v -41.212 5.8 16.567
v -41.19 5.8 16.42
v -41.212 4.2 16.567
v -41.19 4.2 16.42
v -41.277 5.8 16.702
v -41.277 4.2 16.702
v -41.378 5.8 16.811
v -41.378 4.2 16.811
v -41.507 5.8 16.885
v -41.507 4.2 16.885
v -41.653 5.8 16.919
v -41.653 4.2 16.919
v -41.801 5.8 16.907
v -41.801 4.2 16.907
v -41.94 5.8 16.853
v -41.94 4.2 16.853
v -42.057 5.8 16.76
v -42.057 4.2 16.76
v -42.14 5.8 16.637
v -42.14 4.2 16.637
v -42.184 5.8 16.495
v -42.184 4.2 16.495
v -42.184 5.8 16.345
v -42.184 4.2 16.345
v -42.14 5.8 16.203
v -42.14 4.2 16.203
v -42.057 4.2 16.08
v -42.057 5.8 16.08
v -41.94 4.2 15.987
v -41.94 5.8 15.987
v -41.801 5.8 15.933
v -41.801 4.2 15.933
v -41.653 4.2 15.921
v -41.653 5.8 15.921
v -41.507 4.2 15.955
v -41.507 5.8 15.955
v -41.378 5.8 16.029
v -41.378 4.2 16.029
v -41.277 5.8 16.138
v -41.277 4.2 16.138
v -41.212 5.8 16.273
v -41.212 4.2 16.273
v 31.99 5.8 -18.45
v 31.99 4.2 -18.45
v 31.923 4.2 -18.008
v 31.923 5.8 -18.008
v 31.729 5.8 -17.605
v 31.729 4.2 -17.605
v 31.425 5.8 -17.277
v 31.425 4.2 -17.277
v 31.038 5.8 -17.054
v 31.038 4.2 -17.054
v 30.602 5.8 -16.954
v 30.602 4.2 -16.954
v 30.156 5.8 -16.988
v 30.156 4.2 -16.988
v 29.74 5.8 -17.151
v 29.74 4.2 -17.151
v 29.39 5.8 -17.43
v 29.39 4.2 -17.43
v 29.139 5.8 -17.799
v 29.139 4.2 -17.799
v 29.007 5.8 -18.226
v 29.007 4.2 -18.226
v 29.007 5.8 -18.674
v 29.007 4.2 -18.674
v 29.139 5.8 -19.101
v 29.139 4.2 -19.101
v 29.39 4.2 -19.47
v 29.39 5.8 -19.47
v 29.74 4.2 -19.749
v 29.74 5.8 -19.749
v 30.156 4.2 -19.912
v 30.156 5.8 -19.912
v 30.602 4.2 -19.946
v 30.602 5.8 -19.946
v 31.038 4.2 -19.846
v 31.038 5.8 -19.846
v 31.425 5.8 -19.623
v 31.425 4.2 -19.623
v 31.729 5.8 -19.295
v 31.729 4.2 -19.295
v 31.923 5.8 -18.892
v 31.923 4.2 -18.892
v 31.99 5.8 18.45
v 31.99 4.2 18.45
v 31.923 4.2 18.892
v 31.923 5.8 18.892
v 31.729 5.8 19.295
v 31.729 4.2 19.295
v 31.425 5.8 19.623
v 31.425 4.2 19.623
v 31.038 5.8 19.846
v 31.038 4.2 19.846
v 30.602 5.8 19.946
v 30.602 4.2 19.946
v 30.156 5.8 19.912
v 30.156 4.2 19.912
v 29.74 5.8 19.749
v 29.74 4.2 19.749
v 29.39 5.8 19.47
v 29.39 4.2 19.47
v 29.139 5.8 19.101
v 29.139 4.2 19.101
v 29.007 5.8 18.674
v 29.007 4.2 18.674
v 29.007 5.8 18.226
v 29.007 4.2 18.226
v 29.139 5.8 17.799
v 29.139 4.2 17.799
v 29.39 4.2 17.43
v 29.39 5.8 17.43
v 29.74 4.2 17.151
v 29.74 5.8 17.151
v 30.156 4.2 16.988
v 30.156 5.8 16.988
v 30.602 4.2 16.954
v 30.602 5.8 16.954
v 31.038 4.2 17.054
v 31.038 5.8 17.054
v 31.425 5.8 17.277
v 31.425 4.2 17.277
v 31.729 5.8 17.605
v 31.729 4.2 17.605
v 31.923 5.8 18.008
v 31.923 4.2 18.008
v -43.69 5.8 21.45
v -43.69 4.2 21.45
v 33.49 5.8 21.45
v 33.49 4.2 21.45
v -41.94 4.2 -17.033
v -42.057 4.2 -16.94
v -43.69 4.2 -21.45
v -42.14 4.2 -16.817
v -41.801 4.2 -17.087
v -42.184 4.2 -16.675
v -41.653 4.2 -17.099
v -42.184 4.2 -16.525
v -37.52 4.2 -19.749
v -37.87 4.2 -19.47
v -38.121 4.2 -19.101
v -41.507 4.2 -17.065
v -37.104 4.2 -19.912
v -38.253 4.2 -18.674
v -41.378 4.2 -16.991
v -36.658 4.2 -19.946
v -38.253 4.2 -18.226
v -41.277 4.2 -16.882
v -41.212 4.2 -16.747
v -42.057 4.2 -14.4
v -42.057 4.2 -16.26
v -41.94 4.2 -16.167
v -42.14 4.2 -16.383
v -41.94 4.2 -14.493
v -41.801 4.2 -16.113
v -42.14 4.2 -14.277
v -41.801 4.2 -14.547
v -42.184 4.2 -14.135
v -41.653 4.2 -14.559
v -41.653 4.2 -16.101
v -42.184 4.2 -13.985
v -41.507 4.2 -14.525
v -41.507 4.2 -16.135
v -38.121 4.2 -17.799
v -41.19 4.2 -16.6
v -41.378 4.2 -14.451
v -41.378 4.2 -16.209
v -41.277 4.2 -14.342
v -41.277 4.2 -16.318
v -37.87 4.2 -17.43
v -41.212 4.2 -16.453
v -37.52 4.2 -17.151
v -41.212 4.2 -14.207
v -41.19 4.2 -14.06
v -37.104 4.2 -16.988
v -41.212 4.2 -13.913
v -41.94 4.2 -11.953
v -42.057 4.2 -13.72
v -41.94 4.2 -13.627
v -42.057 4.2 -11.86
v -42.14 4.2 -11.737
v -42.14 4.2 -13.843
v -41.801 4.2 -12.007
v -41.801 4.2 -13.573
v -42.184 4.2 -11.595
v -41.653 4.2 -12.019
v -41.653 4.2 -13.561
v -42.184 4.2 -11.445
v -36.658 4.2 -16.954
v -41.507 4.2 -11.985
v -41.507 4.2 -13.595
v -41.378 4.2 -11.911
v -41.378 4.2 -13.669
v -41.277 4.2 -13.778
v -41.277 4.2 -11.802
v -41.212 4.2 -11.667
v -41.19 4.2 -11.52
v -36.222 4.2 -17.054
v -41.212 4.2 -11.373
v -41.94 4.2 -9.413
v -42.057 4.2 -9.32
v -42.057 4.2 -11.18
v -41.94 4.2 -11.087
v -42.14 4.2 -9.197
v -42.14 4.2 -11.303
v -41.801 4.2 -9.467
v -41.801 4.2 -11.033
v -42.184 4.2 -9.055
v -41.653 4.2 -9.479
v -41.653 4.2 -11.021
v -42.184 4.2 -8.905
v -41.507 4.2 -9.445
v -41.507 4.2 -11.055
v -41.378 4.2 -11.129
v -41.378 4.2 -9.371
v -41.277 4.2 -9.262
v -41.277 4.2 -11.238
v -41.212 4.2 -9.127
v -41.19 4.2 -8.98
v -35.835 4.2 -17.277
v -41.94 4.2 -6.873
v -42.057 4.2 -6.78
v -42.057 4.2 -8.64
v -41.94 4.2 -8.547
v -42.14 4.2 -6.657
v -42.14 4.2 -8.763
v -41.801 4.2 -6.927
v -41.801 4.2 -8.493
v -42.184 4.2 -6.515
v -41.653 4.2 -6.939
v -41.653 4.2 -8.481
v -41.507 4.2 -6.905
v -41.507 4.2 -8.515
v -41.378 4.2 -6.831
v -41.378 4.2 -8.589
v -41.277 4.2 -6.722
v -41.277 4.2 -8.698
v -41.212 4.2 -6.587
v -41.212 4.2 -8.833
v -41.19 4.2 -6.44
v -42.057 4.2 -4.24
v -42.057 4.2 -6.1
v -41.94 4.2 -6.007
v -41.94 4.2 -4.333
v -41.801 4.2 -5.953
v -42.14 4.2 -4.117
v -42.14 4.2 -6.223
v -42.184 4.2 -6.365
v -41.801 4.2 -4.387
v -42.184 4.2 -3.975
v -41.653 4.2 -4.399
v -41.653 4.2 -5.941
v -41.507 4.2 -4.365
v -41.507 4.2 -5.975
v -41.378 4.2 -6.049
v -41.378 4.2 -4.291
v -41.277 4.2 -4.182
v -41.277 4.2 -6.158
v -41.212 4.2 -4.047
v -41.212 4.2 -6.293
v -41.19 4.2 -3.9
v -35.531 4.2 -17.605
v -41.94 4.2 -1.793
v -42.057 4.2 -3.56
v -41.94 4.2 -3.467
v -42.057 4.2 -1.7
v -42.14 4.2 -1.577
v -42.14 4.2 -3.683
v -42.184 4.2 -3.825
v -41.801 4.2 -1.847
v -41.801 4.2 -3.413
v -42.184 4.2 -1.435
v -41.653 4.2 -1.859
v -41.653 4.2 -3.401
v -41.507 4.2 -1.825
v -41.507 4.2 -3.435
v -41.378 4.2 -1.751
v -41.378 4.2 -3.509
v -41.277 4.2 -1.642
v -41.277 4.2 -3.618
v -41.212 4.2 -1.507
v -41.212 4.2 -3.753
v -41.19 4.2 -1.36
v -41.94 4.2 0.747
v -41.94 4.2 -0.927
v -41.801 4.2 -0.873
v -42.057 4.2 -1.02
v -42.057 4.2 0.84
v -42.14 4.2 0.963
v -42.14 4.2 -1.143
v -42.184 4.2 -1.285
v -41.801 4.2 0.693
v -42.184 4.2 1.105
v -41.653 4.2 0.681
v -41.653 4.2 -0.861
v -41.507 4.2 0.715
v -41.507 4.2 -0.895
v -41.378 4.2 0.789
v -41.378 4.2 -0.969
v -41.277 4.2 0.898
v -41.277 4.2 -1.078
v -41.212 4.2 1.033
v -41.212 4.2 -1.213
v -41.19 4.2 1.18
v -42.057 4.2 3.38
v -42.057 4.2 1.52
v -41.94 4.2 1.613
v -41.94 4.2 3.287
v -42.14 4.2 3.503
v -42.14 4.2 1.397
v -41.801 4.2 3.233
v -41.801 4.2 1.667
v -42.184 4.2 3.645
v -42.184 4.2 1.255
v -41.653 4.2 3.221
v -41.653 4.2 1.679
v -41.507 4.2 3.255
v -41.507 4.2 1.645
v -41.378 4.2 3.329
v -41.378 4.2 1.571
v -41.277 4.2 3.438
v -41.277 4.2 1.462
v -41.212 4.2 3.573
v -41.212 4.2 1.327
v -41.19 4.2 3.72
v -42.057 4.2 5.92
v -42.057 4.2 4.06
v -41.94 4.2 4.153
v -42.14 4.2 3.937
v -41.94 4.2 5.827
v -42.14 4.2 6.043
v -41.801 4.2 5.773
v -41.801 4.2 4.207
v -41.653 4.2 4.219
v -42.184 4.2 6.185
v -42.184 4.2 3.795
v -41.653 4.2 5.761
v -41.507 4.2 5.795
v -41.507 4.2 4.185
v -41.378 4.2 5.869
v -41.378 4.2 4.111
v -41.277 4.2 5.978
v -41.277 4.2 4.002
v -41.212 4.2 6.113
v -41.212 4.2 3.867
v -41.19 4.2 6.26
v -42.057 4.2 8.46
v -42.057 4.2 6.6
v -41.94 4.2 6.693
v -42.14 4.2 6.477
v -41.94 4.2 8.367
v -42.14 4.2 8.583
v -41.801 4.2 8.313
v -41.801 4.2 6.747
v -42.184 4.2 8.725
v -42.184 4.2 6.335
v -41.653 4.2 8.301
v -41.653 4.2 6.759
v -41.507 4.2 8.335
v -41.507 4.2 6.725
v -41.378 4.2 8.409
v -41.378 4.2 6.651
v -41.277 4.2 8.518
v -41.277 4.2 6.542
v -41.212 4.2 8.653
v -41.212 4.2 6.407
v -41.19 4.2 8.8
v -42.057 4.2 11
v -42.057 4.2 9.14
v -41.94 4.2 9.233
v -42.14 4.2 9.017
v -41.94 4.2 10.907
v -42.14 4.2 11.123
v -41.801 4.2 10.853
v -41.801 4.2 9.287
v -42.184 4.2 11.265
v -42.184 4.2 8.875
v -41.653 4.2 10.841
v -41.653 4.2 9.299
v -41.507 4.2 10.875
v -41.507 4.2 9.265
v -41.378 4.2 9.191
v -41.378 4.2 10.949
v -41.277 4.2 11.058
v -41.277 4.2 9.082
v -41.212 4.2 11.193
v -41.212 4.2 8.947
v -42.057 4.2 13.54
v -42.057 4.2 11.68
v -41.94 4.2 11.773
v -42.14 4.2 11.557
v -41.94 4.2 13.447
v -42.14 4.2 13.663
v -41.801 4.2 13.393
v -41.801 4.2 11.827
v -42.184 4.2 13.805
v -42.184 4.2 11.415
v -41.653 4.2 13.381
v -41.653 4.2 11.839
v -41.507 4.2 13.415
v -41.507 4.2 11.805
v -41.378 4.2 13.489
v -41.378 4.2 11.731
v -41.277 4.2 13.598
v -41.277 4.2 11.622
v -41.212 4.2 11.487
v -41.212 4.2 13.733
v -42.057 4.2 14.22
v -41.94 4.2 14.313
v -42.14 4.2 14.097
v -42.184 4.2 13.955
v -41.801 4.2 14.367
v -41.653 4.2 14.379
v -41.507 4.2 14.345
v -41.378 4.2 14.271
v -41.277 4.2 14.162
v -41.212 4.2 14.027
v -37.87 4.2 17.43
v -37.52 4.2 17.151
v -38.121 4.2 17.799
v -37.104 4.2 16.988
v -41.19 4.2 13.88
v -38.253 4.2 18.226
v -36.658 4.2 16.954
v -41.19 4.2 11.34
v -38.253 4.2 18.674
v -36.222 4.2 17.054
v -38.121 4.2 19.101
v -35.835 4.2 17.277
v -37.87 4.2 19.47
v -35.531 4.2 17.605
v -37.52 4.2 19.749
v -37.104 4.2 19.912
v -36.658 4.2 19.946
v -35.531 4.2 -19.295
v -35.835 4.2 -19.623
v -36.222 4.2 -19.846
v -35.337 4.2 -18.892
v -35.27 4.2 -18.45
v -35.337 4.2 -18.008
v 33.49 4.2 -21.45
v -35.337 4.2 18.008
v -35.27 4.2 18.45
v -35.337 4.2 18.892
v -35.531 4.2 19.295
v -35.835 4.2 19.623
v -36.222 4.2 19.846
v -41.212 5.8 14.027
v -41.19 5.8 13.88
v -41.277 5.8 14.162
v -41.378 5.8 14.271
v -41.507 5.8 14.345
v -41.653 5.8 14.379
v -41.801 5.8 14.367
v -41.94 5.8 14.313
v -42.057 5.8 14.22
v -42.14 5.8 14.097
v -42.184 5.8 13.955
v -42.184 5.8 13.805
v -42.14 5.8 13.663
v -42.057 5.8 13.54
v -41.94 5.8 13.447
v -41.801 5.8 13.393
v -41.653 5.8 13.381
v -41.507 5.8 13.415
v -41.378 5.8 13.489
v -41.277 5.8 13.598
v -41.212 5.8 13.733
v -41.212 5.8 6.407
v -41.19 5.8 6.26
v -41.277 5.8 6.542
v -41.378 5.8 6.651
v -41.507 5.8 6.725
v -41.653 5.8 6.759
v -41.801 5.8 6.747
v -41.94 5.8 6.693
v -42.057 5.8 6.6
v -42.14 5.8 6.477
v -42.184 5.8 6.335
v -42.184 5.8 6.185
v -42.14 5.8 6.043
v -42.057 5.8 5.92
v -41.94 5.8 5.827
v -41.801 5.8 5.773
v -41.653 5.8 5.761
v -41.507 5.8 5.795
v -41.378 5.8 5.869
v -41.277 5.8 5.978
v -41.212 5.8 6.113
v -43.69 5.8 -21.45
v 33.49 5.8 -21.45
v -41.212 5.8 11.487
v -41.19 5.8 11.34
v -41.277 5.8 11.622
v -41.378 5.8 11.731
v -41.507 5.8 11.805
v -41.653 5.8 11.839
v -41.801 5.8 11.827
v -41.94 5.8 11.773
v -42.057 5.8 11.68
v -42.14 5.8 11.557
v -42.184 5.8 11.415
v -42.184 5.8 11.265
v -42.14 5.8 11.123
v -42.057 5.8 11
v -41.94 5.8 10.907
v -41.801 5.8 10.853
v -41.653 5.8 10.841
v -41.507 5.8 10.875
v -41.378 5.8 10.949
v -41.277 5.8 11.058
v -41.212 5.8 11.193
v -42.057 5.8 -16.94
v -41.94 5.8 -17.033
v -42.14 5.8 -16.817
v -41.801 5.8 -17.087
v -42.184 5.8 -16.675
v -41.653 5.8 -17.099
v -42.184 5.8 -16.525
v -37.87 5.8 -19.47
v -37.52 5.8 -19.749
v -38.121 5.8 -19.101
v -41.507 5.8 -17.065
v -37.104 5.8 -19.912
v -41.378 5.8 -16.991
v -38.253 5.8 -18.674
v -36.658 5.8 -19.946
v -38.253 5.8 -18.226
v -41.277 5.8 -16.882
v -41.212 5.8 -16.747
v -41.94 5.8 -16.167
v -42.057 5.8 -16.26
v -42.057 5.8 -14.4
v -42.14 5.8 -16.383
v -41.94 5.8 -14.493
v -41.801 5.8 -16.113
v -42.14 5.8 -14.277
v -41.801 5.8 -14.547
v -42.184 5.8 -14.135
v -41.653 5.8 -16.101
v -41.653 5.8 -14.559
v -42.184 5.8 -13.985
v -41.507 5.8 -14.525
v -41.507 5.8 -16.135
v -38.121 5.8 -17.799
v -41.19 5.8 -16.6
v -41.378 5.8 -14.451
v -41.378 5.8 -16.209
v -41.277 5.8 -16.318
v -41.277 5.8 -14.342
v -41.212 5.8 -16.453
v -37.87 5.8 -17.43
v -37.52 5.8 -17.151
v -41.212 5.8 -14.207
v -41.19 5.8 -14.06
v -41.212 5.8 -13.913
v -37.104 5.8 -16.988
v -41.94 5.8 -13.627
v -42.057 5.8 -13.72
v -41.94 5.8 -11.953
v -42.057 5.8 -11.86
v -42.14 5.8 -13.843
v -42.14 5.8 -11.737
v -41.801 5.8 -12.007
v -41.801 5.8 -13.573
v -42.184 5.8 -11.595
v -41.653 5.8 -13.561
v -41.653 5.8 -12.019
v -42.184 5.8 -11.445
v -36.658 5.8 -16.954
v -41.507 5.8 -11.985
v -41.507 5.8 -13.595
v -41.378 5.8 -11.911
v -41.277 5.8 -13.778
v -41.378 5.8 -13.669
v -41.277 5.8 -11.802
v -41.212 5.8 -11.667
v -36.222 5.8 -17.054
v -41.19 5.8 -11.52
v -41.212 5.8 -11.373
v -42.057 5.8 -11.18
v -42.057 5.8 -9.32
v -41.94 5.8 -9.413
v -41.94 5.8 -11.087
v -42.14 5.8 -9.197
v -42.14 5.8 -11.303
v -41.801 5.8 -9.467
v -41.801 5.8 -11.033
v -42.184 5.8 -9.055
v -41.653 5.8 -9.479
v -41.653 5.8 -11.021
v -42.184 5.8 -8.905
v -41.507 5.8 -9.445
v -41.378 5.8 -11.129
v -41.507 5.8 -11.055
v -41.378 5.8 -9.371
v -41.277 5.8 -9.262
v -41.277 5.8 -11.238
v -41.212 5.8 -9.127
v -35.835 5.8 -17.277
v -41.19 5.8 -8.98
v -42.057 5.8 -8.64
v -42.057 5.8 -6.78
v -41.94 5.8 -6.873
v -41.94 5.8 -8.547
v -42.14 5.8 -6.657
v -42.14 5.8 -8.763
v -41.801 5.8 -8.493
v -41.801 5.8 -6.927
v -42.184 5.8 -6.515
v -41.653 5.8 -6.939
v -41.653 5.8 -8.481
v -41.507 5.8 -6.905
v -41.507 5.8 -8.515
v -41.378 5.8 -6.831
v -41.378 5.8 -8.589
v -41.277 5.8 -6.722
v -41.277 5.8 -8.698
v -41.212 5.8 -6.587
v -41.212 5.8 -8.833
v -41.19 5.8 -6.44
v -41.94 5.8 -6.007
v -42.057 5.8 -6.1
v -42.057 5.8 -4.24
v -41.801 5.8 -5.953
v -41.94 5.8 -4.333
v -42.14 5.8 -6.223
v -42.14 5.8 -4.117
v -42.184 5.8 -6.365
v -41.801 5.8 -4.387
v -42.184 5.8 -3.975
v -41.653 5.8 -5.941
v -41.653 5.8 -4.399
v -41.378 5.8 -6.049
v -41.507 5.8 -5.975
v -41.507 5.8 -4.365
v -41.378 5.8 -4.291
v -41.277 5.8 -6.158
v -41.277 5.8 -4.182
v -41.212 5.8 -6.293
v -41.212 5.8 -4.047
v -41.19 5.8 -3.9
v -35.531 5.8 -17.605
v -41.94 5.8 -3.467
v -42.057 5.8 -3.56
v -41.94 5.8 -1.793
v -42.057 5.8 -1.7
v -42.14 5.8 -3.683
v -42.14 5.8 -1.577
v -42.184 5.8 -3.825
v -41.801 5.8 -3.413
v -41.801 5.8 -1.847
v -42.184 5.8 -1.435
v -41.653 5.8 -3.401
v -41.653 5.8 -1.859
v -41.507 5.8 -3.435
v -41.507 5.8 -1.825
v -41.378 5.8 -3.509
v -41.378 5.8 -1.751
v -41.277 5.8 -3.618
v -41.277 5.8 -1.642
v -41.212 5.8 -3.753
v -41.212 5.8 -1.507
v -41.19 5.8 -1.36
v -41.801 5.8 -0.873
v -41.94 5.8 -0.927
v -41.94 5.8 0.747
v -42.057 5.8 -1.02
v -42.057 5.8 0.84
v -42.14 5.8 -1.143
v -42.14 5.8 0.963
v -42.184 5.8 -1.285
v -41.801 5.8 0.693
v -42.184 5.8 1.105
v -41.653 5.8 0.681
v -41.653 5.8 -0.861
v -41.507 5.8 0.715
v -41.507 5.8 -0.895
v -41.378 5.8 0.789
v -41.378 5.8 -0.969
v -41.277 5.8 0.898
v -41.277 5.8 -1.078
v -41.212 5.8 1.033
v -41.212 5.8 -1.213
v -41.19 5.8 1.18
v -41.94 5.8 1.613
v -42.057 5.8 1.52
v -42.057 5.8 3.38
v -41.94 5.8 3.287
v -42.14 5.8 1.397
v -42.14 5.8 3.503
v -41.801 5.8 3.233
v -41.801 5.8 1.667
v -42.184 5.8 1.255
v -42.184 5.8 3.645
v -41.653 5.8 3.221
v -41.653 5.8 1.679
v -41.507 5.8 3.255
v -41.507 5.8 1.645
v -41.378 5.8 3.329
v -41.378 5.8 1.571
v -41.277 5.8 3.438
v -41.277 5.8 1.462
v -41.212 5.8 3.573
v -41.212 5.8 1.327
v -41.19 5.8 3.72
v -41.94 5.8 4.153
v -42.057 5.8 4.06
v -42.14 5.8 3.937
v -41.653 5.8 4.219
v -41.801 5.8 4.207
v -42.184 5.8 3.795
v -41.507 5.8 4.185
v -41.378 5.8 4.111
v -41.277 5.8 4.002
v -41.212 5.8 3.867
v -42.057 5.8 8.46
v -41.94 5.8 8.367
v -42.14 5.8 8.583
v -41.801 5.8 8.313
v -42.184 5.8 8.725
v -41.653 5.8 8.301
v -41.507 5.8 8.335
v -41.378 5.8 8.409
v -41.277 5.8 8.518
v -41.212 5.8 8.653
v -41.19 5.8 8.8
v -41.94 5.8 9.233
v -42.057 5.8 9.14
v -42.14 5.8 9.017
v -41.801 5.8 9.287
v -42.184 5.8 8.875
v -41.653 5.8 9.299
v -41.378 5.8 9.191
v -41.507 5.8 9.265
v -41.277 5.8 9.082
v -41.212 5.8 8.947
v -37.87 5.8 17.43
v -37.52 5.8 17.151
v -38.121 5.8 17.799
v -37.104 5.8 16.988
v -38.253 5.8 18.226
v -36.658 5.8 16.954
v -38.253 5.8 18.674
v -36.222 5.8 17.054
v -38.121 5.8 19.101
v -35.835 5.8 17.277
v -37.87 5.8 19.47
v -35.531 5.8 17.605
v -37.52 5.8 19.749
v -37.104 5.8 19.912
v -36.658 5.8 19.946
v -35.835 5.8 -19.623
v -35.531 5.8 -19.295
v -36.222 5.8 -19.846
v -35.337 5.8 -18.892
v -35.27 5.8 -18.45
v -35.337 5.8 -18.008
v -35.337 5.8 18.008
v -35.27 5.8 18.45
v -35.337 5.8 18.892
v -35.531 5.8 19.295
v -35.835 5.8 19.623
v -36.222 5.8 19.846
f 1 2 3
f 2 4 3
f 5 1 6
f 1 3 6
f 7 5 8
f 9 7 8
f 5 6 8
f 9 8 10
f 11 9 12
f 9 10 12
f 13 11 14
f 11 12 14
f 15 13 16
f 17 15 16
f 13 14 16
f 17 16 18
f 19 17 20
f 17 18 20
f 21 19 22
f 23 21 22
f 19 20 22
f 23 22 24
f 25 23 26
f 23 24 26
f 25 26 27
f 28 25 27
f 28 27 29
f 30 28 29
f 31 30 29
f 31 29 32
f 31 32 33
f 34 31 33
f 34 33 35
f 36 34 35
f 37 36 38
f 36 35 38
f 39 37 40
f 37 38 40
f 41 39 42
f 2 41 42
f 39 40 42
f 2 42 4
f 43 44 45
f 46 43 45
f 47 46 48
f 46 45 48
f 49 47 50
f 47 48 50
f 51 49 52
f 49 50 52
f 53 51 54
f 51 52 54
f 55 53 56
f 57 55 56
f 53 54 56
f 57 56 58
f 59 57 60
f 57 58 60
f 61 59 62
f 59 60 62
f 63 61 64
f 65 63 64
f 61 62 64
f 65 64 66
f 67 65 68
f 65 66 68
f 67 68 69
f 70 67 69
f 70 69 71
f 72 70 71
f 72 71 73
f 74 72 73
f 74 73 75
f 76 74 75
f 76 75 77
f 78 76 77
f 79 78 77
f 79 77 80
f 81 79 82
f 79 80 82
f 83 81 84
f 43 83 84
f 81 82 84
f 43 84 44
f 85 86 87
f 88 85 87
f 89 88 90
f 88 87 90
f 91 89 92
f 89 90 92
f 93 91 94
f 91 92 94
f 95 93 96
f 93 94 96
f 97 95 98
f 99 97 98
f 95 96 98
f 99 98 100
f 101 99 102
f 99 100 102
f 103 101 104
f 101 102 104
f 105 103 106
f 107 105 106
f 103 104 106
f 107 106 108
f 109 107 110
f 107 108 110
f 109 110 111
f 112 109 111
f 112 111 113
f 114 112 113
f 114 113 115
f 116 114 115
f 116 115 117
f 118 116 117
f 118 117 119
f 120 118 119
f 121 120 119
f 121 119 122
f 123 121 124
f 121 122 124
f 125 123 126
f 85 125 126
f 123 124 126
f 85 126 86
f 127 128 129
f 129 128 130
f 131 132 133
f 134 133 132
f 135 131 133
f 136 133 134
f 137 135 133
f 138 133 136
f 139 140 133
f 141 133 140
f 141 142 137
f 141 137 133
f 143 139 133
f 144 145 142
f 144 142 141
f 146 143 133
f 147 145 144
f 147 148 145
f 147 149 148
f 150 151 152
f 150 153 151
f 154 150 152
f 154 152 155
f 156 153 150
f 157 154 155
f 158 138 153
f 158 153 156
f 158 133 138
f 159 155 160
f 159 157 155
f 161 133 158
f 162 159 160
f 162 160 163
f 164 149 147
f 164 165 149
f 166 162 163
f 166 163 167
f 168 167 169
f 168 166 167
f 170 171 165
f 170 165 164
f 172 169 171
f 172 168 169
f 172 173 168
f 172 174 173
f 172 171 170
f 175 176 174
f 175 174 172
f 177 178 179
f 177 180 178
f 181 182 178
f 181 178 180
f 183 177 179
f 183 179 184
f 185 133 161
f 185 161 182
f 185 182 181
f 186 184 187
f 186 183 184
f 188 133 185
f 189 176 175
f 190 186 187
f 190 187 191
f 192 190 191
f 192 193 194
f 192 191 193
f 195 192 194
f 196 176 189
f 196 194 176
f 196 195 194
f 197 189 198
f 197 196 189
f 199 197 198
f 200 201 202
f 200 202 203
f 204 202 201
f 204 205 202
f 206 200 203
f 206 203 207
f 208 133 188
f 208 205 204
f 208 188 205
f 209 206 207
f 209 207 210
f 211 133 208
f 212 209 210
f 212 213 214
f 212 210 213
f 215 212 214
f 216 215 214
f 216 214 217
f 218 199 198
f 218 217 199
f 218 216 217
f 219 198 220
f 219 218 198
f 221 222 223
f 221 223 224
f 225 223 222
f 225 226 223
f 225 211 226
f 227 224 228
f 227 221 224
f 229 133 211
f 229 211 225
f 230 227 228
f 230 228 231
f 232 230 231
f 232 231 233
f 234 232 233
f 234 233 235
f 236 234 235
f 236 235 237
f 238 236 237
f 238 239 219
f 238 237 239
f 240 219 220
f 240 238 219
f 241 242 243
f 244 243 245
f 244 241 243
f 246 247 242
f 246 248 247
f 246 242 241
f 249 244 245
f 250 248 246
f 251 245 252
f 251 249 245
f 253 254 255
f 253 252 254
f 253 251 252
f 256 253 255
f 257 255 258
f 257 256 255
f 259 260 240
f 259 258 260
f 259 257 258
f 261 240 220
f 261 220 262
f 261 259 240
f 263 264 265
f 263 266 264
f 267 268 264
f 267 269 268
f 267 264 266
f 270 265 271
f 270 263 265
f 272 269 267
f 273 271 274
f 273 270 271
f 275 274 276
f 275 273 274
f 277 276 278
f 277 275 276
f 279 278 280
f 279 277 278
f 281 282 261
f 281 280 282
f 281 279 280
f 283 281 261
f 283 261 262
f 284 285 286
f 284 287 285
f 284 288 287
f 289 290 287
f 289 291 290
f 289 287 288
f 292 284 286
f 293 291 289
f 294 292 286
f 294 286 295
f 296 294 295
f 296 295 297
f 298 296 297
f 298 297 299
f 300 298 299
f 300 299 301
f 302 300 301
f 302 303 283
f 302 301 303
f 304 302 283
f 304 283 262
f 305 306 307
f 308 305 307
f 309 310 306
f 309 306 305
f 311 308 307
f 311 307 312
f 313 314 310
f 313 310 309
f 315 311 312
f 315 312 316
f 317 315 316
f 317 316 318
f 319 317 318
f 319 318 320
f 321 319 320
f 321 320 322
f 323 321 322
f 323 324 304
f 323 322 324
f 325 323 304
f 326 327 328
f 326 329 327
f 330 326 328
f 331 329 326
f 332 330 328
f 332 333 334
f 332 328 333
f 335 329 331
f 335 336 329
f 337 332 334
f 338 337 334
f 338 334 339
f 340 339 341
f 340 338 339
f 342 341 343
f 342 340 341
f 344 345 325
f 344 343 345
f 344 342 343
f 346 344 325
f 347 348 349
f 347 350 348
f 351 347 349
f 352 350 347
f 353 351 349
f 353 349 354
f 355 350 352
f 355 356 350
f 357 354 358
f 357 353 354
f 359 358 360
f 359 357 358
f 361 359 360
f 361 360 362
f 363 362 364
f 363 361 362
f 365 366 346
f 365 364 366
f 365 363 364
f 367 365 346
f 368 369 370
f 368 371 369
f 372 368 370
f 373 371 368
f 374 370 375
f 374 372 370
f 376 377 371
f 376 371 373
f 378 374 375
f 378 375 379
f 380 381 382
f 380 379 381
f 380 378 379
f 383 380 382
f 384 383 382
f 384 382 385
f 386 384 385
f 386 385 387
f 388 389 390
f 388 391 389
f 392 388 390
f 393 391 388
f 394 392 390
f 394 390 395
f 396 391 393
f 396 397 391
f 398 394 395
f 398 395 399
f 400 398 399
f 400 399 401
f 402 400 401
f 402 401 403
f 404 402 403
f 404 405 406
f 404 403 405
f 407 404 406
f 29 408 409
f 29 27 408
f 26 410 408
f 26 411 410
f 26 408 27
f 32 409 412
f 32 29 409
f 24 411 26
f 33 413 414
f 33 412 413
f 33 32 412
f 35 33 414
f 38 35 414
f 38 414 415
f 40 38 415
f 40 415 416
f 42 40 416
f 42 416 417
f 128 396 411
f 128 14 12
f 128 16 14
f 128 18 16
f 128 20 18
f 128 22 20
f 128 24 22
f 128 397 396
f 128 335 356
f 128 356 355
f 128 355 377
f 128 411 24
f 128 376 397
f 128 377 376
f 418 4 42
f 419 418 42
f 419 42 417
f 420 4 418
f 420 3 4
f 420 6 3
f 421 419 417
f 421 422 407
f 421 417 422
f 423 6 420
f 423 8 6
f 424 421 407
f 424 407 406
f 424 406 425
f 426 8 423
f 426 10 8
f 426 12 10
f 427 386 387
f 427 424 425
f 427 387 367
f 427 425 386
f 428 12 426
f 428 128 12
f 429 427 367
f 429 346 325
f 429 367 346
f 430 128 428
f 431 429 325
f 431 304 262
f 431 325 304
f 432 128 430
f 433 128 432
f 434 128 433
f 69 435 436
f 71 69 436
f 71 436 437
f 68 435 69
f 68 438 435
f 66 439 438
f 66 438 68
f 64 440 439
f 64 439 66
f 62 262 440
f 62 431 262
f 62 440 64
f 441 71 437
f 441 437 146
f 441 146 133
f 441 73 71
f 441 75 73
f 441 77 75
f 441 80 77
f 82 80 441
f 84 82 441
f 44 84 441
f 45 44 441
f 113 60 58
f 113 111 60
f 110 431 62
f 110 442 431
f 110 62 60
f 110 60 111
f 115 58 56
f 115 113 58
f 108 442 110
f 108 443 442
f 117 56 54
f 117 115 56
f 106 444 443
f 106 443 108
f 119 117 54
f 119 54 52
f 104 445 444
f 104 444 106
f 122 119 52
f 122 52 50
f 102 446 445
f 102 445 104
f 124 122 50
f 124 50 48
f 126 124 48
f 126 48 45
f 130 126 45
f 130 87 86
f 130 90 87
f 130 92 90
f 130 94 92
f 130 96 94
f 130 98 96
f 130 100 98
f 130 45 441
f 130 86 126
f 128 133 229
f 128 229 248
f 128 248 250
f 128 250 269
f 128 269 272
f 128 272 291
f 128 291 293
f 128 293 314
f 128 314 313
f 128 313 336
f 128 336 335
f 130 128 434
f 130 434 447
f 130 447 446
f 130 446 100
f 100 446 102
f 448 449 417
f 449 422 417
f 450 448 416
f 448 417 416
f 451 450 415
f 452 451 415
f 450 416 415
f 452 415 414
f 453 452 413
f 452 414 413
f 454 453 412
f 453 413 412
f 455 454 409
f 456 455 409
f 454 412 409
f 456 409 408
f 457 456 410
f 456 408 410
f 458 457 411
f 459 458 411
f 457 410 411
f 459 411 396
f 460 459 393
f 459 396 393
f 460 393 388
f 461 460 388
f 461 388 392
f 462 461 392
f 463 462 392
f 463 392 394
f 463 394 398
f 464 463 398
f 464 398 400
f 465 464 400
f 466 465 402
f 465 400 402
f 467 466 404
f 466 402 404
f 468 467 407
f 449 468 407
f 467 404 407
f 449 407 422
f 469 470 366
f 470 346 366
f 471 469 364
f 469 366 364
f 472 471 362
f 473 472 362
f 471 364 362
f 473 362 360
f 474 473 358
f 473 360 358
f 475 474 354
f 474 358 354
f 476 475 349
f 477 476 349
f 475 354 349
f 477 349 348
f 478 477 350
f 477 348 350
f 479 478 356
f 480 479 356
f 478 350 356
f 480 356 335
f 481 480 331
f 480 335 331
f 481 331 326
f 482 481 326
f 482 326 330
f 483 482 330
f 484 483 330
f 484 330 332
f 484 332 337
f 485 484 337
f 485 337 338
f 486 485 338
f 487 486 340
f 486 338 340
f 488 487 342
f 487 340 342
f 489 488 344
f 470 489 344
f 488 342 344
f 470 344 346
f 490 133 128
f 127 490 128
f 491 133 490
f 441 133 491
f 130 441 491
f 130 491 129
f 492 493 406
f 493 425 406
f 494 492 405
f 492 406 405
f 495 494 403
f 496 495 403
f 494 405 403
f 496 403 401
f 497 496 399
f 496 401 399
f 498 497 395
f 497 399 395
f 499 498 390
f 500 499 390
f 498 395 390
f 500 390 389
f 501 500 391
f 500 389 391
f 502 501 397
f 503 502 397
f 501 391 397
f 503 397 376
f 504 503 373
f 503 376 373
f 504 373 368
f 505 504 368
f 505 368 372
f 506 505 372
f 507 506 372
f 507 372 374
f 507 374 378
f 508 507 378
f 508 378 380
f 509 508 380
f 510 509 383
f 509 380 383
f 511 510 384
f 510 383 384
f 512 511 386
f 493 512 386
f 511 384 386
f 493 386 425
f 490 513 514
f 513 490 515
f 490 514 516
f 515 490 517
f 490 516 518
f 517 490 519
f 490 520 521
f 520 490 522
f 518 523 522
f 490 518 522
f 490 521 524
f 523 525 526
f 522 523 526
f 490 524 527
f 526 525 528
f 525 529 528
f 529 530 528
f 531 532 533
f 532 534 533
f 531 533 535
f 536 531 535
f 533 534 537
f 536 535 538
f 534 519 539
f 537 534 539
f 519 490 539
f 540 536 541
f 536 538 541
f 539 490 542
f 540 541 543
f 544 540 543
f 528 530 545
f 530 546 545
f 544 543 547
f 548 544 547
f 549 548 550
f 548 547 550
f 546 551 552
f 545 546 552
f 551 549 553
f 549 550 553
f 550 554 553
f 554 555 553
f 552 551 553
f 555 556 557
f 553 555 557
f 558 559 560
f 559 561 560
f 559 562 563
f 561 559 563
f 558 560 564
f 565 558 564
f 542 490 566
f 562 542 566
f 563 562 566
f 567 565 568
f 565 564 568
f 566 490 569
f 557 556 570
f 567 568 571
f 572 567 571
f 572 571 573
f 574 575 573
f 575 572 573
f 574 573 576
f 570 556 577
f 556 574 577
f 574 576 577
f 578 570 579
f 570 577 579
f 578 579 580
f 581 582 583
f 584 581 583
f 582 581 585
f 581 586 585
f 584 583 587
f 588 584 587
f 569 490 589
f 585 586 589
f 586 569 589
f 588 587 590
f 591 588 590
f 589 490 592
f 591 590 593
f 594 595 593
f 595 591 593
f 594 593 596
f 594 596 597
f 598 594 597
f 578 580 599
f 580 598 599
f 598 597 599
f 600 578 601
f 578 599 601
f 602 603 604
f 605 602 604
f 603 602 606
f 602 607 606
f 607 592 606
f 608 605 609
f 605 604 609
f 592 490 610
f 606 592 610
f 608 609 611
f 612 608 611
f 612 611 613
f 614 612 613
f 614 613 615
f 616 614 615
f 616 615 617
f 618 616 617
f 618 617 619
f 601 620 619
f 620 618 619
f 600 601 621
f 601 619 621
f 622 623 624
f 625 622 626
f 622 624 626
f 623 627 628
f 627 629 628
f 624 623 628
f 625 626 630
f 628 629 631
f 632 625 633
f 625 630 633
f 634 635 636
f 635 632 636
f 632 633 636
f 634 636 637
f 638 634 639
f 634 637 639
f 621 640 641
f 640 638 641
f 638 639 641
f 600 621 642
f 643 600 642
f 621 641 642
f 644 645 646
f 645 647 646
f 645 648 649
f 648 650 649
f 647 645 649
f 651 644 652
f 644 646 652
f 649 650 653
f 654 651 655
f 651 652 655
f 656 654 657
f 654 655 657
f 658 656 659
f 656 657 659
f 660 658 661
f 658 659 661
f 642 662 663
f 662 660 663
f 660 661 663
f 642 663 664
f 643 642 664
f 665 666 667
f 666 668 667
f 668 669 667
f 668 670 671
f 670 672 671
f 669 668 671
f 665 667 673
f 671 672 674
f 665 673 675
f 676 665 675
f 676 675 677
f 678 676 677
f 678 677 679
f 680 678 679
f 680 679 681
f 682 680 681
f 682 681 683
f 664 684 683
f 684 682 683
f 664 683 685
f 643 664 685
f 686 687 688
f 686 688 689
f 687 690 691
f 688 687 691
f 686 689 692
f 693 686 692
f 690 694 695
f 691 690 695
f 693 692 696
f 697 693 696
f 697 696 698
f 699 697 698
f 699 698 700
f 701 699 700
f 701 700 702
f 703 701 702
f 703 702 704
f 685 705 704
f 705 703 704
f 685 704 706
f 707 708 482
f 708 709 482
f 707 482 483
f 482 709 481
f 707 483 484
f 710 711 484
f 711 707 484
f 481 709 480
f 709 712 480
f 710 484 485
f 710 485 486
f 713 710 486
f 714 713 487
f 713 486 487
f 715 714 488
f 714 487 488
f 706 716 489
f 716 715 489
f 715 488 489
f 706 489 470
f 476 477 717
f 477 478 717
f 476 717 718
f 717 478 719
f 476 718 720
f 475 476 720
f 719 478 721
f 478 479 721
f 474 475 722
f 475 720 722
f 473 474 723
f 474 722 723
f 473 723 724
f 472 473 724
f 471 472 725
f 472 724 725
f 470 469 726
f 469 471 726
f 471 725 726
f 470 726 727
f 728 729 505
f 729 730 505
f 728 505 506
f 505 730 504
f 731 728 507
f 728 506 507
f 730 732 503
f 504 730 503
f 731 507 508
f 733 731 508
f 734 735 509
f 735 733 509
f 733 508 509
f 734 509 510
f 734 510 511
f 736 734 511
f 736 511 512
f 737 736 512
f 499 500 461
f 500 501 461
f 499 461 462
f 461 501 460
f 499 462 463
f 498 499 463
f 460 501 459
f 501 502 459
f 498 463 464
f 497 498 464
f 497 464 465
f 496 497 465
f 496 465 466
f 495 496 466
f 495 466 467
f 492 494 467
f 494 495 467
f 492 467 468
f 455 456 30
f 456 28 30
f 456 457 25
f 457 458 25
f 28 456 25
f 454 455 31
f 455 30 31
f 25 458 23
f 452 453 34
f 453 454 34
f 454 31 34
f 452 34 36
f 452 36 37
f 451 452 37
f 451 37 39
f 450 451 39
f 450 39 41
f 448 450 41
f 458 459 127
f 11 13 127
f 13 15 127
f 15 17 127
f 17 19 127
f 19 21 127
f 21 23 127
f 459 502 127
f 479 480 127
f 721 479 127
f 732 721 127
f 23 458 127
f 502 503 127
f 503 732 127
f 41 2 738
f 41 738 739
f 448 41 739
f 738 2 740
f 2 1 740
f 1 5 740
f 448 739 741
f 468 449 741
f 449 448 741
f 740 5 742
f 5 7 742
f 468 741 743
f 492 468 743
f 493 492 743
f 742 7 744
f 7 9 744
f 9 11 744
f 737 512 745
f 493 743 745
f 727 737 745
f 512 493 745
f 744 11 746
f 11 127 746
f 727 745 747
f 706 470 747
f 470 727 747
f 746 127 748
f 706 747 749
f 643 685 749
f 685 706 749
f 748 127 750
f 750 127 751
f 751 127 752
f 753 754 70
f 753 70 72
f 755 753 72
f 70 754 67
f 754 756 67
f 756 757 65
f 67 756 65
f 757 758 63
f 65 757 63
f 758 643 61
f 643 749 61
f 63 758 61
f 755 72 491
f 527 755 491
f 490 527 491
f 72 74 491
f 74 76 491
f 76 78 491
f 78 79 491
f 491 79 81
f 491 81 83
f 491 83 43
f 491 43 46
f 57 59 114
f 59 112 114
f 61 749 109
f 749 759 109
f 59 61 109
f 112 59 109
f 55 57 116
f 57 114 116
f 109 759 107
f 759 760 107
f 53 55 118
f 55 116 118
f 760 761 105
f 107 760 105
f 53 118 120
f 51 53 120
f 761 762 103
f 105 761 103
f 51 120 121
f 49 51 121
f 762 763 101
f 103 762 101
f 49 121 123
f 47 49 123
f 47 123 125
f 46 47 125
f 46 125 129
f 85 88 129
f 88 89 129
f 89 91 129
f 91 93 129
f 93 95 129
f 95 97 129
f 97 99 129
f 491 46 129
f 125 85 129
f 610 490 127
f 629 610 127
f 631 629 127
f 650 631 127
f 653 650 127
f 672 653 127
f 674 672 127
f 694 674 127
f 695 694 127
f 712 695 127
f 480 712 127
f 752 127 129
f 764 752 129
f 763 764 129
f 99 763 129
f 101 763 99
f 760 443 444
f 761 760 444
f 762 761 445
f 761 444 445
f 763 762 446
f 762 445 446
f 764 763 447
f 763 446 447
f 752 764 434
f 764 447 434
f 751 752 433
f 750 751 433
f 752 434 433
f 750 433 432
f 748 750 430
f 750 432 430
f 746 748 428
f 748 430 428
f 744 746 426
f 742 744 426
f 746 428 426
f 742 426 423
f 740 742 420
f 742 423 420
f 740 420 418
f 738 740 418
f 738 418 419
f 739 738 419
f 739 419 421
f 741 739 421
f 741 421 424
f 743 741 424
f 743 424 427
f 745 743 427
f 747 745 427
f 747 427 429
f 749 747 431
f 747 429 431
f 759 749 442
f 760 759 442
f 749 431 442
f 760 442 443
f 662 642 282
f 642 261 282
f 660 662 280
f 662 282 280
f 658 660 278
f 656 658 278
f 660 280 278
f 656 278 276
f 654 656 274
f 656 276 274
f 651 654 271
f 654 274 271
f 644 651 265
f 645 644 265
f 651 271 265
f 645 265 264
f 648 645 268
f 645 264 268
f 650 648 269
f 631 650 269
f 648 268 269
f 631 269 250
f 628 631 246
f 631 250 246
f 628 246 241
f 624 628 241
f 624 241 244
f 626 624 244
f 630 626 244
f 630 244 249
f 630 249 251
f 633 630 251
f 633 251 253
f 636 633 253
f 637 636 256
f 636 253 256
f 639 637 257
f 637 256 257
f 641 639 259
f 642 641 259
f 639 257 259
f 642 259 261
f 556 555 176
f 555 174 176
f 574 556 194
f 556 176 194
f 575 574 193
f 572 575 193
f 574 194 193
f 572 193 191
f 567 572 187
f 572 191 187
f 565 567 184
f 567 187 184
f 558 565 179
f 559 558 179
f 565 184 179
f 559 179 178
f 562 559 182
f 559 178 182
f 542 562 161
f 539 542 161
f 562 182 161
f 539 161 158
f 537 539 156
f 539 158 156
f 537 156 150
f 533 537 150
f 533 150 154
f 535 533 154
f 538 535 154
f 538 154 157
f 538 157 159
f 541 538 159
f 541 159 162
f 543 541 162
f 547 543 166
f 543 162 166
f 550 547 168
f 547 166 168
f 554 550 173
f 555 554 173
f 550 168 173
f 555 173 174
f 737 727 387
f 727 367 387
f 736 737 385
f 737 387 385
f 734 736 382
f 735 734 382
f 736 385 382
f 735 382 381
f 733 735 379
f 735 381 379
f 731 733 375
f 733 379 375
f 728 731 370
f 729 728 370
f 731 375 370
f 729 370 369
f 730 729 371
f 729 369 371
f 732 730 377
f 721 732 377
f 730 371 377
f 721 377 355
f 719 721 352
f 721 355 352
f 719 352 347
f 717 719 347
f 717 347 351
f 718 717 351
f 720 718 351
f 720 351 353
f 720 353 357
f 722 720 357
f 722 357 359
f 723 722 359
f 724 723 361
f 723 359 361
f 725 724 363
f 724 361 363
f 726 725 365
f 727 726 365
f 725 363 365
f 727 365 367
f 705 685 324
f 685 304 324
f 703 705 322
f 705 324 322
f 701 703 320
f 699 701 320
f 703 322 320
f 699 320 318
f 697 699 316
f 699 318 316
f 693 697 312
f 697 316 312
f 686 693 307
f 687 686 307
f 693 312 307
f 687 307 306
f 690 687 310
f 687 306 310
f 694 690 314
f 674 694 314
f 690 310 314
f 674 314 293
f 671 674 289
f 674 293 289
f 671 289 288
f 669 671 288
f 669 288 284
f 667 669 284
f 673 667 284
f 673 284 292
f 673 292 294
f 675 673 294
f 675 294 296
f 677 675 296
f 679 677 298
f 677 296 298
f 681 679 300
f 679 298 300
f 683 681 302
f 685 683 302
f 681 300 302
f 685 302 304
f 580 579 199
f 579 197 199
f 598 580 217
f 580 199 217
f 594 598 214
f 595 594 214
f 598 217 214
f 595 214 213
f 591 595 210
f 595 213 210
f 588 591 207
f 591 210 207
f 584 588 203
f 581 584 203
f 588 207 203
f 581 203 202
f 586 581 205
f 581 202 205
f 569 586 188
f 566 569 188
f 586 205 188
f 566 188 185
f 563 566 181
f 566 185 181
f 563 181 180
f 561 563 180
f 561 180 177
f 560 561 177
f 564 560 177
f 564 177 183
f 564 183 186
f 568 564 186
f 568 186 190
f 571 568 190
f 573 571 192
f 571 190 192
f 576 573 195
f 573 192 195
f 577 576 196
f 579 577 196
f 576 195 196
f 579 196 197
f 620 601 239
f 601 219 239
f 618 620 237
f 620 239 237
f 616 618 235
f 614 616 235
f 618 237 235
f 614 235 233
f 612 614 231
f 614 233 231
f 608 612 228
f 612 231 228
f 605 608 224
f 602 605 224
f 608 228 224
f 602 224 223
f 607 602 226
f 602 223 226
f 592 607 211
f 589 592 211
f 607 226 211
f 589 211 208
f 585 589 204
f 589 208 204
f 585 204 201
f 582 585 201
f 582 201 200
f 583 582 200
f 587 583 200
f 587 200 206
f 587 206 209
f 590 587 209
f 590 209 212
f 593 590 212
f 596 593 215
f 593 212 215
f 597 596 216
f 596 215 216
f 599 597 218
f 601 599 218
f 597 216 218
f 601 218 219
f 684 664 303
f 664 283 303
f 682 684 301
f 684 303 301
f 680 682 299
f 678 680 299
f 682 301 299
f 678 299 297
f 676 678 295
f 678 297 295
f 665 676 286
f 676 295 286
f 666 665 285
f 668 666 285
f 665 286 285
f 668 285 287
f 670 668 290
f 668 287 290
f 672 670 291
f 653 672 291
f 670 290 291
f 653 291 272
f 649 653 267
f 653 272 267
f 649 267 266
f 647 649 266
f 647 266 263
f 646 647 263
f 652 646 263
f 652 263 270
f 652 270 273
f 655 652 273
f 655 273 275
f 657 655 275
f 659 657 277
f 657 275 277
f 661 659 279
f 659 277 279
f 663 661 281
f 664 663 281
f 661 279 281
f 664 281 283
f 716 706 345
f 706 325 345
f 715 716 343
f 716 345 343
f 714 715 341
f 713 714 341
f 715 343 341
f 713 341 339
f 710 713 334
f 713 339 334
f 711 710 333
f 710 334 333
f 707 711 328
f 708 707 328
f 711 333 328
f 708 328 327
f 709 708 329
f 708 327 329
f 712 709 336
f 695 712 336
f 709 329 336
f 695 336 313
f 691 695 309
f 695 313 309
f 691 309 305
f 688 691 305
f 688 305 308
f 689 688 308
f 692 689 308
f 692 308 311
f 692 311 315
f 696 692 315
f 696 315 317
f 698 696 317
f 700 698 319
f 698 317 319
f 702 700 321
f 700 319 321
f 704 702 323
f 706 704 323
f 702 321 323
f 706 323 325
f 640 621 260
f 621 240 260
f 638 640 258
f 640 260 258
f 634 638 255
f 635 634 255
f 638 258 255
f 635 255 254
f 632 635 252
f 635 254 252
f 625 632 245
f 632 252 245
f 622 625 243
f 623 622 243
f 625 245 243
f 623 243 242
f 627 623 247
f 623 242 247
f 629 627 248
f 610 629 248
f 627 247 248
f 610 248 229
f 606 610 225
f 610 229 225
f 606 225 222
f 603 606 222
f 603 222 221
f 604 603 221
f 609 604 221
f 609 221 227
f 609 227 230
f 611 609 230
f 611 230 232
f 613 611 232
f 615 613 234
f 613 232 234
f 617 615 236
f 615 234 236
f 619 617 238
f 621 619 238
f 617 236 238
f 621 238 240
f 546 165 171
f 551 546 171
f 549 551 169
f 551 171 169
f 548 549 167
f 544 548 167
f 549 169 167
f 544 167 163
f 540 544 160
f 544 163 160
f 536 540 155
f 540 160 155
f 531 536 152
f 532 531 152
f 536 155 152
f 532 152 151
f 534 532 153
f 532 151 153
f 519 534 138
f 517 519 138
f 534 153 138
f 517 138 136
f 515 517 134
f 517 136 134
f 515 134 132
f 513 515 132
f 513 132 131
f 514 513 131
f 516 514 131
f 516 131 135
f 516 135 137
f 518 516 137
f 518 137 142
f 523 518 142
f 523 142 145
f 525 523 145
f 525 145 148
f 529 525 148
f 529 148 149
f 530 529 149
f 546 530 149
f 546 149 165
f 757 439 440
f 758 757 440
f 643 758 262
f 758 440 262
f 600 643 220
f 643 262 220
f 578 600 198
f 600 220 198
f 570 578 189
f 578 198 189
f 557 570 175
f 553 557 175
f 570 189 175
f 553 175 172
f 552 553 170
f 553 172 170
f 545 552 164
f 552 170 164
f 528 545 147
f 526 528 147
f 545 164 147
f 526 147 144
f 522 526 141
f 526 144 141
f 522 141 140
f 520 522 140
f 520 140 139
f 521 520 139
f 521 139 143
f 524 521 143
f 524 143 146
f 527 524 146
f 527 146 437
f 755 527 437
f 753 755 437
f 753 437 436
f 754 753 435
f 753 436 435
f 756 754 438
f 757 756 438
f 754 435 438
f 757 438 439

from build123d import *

# Parameters (mm, degrees)
SKETCH002_W         = 77.18
SKETCH002_H         = 42.9
SKETCH002_R         = 1.5
PAD002_DEPTH        = 1.6
SKETCH004_R         = 0.5
POCKET_DEPTH        = 5.801
POCKET_DEPTH_BACK   = 0.001
LINEARPATTERN_COUNT = 14
LINEARPATTERN_PITCH = 2.54


with BuildPart() as part:
    # Sketch002 → Pad002 (new body)
    with BuildSketch(Plane.XZ.offset(-4.2)):
        with Locations((-5.1, 0)):
            Rectangle(SKETCH002_W, SKETCH002_H)
        with Locations((30.49, 18.45)):
            Circle(SKETCH002_R, mode=Mode.SUBTRACT)
        with Locations((30.49, -18.45)):
            Circle(SKETCH002_R, mode=Mode.SUBTRACT)
        with Locations((-36.77, -18.45)):
            Circle(SKETCH002_R, mode=Mode.SUBTRACT)
        with Locations((-36.77, 18.45)):
            Circle(SKETCH002_R, mode=Mode.SUBTRACT)
    extrude(amount=-PAD002_DEPTH)

    # Sketch004 → Pocket (cut, two sides)
    with BuildSketch(Plane.XZ) as pocket_sk:
        with Locations((-41.69, -16.6)):
            Circle(SKETCH004_R)
    pocket = extrude(amount=-POCKET_DEPTH, mode=Mode.SUBTRACT) + extrude(pocket_sk.sketch, amount=POCKET_DEPTH_BACK, mode=Mode.SUBTRACT)

    # LinearPattern: Pocket ×14
    with Locations(*[(0, 0, i * LINEARPATTERN_PITCH) for i in range(1, LINEARPATTERN_COUNT)]):
        add(pocket, mode=Mode.SUBTRACT)


solid = part.part
